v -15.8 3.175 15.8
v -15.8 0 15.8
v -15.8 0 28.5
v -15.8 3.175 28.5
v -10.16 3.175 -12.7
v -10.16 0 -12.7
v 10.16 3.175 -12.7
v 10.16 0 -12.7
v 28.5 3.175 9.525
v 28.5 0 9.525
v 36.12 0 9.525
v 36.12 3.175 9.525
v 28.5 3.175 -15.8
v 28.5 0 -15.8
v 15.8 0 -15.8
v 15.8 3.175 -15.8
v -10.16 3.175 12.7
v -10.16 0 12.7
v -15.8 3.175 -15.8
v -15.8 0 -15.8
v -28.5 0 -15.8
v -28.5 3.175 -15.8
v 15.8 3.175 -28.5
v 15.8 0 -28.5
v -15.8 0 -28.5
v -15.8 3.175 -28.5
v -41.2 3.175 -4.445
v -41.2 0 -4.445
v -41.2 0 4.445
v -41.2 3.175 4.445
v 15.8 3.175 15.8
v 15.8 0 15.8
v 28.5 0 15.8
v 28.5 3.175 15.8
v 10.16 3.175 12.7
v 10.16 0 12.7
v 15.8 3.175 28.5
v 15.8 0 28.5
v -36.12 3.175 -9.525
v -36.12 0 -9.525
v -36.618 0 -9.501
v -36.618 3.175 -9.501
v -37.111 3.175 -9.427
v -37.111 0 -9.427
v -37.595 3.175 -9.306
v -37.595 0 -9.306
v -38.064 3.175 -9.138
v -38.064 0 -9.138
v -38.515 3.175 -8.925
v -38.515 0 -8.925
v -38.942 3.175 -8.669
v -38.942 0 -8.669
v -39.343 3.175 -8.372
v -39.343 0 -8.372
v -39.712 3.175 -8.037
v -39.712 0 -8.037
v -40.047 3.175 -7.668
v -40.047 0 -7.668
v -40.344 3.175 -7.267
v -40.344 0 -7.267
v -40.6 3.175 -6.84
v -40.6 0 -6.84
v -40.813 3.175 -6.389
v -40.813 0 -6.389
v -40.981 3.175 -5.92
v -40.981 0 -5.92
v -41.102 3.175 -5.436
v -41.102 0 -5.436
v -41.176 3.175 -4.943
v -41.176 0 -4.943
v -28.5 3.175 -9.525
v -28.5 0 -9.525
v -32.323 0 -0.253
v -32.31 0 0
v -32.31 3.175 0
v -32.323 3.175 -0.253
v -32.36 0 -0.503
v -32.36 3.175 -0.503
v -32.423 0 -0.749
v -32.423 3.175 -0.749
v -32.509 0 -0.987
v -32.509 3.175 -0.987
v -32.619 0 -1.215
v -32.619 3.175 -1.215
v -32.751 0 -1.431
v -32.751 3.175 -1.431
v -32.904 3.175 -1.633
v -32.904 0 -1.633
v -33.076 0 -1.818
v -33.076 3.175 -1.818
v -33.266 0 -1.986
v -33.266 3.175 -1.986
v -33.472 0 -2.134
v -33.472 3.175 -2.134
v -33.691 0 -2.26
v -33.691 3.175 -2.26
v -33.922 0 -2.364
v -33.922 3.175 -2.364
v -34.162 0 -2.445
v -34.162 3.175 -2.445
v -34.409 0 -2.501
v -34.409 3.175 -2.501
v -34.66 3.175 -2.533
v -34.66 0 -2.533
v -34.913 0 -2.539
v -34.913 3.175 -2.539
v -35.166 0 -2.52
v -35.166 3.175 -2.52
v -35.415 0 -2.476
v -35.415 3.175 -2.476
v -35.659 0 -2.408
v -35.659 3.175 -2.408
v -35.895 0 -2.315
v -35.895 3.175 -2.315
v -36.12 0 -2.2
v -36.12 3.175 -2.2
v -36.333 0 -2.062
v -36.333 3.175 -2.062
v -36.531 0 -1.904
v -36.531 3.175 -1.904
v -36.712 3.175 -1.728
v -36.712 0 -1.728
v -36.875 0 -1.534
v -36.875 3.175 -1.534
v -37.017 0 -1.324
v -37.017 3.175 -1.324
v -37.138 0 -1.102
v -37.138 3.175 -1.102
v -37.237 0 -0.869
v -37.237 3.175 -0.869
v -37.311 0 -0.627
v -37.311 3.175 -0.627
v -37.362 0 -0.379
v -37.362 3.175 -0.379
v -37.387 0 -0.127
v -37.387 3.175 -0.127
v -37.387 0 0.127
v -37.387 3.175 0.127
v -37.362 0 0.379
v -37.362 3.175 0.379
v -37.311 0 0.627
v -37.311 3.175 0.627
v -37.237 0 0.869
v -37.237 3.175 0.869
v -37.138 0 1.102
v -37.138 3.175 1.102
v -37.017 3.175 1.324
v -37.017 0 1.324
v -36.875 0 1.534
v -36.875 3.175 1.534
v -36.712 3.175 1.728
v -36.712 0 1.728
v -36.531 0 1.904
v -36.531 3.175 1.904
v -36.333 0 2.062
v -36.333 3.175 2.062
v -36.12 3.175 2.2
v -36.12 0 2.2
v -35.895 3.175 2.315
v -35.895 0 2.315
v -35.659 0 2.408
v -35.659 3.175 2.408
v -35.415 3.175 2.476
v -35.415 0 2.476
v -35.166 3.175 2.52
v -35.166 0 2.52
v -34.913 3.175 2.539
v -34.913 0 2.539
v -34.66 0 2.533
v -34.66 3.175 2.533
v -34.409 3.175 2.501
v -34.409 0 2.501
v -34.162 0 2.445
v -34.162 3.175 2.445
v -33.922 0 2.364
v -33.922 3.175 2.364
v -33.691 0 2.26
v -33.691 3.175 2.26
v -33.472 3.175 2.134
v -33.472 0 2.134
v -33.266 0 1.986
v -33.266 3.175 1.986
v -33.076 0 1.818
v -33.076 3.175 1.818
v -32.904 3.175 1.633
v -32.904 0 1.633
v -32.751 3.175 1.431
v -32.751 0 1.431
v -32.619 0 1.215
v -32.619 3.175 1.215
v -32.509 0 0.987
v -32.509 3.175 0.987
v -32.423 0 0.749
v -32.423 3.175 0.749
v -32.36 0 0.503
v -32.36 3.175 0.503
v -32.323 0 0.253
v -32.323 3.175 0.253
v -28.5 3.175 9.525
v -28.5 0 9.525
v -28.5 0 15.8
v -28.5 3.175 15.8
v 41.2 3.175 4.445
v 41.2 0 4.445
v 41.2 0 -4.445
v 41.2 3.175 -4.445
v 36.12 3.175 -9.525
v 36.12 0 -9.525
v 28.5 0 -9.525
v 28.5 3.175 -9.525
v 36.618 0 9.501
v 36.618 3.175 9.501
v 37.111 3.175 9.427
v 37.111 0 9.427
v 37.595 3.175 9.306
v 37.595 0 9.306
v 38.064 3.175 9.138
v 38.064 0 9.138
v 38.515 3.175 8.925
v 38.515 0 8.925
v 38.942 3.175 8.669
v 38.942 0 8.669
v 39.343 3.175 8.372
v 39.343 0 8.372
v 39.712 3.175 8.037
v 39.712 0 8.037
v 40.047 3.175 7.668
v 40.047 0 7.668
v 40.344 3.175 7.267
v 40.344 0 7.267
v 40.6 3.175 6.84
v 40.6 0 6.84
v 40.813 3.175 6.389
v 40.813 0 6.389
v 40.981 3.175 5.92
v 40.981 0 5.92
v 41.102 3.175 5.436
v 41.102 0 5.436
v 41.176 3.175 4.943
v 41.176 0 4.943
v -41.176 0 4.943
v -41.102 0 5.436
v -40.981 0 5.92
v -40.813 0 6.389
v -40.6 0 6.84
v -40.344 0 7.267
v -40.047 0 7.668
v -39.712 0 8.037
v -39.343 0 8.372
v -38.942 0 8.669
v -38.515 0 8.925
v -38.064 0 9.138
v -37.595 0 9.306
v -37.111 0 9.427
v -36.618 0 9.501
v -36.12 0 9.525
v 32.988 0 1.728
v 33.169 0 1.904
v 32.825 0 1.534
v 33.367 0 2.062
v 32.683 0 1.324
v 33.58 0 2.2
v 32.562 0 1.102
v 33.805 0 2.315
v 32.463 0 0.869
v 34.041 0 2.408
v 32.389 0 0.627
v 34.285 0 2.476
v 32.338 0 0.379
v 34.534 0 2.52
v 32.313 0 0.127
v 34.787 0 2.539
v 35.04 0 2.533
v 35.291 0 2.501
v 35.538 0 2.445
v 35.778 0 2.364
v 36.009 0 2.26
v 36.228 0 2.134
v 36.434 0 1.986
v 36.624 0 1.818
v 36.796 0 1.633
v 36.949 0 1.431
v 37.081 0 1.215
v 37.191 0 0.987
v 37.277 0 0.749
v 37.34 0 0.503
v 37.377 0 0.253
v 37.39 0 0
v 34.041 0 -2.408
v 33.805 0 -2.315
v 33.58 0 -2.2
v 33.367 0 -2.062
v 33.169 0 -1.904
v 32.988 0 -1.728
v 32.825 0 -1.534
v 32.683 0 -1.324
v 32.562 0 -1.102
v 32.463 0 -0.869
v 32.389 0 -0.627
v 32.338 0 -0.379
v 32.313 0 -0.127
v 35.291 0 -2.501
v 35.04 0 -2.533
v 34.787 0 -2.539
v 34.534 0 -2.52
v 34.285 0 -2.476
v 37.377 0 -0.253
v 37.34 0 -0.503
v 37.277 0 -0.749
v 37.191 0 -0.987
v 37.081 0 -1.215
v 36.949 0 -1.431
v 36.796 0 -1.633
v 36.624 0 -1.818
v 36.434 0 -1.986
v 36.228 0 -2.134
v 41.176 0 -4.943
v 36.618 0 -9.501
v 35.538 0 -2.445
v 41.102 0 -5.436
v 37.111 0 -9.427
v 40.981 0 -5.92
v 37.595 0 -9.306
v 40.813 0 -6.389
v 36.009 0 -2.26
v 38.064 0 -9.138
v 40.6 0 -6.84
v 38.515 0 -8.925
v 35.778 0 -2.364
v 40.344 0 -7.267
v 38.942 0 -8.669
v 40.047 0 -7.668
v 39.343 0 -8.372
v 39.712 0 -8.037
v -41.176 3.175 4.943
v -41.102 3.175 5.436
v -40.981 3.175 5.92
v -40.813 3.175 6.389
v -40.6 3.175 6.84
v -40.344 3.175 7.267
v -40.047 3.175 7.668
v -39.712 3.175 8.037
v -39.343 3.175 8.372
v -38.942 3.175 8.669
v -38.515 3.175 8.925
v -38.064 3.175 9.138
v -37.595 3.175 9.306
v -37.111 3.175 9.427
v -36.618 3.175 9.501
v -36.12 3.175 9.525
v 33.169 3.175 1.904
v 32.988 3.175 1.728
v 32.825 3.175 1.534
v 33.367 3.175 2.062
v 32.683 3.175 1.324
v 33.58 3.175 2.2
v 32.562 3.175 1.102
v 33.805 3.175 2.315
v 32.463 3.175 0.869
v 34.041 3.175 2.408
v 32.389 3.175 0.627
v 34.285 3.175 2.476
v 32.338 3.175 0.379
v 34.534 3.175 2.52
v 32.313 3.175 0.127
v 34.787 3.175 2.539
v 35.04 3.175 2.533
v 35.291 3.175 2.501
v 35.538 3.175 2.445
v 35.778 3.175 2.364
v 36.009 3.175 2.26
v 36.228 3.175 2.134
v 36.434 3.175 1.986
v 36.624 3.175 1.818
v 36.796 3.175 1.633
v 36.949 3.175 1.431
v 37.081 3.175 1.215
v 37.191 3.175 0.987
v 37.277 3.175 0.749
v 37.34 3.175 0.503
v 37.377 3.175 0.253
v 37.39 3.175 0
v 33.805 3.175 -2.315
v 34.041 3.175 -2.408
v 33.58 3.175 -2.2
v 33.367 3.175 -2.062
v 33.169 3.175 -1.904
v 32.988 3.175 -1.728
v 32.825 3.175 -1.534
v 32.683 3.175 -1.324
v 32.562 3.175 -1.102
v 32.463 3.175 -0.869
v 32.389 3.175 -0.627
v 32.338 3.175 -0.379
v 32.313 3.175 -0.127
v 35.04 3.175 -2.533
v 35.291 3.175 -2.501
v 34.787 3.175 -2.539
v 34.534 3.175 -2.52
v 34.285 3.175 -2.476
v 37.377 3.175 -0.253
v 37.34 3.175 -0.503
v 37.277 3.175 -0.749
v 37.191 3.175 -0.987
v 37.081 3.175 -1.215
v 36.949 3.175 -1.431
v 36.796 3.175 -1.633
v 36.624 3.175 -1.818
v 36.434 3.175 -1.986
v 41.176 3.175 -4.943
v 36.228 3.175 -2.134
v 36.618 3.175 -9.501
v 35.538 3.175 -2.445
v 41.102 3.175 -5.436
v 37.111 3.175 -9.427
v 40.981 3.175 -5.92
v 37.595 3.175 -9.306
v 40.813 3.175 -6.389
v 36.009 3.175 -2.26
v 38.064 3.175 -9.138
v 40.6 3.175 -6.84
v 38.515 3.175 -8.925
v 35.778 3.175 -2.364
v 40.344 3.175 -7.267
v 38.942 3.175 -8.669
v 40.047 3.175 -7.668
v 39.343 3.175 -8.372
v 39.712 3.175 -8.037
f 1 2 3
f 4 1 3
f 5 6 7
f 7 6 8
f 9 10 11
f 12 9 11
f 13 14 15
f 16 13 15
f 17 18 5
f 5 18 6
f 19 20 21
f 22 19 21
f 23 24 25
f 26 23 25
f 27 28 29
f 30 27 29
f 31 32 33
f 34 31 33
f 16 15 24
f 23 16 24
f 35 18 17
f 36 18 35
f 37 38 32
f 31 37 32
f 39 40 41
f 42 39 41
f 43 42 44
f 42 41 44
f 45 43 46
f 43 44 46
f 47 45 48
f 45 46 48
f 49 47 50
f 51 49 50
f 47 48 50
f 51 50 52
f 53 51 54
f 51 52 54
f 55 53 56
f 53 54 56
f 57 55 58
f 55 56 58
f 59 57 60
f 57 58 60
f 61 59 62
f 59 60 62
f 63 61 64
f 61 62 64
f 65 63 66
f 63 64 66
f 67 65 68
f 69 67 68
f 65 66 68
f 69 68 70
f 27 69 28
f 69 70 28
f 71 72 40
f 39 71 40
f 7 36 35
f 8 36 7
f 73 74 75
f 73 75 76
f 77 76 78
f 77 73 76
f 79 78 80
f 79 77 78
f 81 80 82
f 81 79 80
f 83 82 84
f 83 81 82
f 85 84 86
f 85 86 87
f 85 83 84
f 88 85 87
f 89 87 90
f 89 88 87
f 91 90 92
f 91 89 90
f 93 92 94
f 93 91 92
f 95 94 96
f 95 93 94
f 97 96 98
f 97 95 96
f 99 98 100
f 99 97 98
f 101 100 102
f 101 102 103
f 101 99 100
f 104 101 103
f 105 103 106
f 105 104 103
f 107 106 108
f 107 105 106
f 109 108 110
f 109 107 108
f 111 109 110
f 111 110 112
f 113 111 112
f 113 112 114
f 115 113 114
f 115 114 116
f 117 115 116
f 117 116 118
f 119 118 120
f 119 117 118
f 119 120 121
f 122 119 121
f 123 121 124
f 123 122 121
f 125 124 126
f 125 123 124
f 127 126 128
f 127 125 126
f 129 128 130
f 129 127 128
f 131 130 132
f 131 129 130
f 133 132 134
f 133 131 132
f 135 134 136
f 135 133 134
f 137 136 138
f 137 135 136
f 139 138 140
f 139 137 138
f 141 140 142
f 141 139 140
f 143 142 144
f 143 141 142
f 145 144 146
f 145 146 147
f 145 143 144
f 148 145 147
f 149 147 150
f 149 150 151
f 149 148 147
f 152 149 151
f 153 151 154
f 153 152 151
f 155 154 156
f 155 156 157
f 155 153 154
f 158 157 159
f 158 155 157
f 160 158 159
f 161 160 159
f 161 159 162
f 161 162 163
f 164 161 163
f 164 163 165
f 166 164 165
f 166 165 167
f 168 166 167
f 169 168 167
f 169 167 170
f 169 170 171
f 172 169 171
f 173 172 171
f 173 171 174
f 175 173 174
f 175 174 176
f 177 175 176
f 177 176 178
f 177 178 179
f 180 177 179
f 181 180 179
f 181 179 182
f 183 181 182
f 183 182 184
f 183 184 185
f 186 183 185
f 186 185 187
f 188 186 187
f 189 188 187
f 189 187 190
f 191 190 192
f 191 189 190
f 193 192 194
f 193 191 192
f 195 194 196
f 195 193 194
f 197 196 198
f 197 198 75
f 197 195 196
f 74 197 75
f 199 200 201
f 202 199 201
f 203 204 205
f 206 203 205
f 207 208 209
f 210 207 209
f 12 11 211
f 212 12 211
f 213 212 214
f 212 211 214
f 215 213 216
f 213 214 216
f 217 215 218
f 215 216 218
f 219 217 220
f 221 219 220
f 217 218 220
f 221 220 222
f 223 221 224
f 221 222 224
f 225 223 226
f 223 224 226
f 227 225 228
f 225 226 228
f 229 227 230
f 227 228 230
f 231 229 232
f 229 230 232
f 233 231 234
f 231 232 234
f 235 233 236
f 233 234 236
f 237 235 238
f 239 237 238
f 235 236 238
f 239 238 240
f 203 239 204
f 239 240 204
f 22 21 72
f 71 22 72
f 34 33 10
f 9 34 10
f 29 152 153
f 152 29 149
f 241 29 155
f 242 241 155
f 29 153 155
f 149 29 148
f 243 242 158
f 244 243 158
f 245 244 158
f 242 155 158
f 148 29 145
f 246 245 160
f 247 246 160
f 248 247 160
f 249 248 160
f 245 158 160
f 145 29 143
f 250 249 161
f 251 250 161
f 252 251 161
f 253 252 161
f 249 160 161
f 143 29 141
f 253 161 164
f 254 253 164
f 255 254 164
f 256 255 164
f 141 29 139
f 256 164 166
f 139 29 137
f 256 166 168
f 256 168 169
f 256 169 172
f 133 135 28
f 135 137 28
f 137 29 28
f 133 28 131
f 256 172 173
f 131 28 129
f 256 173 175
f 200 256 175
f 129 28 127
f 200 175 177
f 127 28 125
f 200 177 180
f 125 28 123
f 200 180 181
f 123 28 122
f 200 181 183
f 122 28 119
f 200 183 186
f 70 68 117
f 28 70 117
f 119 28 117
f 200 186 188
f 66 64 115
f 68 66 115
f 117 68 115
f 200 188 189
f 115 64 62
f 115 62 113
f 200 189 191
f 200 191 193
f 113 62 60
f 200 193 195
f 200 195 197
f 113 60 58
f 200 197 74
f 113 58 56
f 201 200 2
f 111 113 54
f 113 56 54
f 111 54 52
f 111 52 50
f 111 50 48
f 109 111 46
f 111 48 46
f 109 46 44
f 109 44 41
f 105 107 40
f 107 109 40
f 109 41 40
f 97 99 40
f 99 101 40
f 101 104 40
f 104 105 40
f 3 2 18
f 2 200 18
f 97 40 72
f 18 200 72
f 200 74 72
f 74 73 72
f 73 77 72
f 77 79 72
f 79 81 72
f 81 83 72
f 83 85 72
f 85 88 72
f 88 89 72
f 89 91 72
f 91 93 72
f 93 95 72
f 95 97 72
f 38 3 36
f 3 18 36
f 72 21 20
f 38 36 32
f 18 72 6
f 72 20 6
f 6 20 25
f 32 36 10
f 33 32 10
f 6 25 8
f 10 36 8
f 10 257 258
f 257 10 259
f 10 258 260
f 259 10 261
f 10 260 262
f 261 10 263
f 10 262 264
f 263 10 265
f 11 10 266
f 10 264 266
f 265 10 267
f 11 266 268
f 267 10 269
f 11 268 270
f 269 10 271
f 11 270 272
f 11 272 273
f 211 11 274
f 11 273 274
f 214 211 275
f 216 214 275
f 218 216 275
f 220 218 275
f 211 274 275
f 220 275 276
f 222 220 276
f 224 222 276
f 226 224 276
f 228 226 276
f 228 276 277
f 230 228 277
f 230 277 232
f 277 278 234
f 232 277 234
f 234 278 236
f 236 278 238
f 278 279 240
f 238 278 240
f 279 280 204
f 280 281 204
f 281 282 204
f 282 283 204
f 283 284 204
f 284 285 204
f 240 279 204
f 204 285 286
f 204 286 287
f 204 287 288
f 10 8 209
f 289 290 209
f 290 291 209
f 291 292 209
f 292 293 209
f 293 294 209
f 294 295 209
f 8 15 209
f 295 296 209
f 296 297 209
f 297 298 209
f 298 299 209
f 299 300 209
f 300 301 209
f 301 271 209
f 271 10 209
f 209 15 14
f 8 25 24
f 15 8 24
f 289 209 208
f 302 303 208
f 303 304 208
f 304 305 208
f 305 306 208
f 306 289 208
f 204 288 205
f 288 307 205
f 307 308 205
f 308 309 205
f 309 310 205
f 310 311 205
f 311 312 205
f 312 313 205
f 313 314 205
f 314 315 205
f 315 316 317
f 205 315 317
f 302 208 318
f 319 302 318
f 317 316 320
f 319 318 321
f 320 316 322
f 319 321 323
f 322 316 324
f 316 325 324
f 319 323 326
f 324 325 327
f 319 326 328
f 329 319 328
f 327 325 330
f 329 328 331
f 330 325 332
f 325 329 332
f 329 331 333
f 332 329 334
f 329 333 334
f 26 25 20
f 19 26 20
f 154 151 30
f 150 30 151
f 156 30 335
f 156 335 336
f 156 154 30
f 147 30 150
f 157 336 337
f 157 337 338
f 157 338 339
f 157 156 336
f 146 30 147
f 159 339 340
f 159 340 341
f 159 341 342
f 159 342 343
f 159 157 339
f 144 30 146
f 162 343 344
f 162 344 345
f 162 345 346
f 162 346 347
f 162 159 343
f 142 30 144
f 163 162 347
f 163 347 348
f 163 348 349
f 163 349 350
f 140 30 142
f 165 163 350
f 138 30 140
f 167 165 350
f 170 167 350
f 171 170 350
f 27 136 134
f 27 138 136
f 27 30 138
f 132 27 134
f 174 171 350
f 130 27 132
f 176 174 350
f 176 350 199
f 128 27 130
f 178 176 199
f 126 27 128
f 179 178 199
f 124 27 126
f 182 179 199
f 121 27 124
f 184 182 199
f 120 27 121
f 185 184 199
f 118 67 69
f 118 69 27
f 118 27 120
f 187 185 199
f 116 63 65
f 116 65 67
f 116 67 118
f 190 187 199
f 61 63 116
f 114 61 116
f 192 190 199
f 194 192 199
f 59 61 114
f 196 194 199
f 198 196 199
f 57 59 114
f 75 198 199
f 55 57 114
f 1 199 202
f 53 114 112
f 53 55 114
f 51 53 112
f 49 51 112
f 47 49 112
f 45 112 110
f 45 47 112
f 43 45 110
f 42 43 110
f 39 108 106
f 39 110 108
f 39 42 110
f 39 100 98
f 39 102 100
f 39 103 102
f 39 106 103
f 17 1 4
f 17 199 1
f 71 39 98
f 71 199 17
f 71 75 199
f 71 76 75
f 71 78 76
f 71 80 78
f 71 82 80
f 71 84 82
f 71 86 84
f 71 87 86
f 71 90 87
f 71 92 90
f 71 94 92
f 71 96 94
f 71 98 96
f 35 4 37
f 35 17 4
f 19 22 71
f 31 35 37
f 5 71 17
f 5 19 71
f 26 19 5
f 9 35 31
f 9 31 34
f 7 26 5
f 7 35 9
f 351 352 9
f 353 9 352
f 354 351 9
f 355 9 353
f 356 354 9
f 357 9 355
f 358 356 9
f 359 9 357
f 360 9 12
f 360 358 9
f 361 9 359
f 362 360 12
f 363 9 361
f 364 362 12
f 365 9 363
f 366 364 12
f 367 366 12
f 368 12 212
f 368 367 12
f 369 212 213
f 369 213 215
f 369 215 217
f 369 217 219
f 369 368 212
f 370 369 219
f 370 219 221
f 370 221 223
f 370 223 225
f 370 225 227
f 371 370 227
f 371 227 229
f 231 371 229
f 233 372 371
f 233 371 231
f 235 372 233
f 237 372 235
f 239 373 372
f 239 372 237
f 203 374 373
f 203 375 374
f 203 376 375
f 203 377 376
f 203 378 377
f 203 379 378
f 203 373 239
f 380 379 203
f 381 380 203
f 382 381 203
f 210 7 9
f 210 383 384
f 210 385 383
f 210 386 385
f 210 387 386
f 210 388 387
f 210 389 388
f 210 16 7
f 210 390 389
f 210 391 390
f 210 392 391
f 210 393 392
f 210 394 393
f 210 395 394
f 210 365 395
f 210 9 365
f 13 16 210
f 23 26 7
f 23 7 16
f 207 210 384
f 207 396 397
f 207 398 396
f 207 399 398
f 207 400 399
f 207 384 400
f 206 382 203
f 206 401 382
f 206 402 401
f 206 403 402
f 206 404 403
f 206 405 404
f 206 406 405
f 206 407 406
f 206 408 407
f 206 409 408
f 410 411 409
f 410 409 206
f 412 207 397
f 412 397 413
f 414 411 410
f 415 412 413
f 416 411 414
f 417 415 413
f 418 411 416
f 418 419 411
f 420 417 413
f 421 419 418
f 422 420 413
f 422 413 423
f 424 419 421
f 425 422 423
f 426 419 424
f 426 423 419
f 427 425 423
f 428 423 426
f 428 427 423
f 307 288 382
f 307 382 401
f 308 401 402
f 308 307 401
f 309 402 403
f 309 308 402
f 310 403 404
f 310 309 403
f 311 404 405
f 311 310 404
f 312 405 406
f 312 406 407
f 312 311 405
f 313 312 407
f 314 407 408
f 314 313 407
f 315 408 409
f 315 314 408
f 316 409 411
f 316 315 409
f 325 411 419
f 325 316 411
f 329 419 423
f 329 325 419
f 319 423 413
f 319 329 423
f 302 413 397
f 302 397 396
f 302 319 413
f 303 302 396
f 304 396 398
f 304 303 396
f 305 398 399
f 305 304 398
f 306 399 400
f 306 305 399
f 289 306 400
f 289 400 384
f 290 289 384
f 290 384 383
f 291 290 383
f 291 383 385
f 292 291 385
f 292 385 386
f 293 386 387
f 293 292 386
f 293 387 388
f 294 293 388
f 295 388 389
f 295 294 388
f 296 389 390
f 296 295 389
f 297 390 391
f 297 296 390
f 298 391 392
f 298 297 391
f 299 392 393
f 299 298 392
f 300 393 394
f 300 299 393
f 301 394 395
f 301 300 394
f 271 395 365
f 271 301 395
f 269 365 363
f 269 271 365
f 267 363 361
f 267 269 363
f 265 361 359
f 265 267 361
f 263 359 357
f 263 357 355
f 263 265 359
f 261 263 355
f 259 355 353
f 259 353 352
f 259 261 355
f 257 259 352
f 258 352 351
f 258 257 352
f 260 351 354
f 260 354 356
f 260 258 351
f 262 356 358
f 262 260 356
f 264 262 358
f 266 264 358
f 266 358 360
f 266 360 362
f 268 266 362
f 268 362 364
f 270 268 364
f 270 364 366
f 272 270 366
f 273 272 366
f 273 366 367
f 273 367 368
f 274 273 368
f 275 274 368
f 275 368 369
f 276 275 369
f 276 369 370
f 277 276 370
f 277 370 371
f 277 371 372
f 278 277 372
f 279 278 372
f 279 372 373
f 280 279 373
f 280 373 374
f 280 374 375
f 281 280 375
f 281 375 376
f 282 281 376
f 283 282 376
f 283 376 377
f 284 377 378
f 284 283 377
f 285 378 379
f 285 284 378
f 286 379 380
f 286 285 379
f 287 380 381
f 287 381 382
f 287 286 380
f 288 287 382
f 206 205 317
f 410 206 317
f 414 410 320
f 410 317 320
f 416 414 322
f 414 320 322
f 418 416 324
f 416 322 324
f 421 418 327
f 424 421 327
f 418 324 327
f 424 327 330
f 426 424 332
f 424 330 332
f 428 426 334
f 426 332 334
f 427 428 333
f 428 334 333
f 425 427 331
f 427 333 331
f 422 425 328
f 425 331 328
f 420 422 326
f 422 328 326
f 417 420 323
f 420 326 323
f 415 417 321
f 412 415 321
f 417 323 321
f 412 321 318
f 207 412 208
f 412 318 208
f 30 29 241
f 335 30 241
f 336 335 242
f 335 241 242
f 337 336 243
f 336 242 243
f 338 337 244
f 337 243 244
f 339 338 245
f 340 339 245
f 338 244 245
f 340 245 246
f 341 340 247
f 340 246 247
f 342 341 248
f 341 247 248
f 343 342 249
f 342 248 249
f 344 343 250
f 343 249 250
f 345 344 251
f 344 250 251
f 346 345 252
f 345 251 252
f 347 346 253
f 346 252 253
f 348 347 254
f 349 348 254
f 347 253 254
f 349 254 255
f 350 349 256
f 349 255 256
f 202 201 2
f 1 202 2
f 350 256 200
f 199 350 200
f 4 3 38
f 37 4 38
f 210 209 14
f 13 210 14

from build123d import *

# Parameters (mm, degrees)
SKETCH1_R           = 2.54
SKETCH1_W           = 20.32
SKETCH1_H           = 25.4
BOSS_EXTRUDE1_DEPTH = 3.175


with BuildPart() as part:
    # Sketch1 → Boss-Extrude1 (new body)
    with BuildSketch(Plane(origin=(0, 0, 0), x_dir=(1, 0, 0), z_dir=(0, 1, 0))):
        with BuildLine():
            Line((-28.4999938, 15.7999938), (-28.4999938, 9.525))
            Line((-28.4999938, 9.525), (-36.1199938, 9.525))
            ThreePointArc((-36.1199938, 9.525), (-39.712096248, 8.037102448), (-41.1999938, 4.445))
            Line((-41.1999938, 4.445), (-41.1999938, -4.445))
            ThreePointArc((-41.1999938, -4.445), (-39.712096248, -8.037102448), (-36.1199938, -9.525))
            Line((-36.1199938, -9.525), (-28.4999938, -9.525))
            Line((-28.4999938, -9.525), (-28.4999938, -15.7999938))
            Line((-28.4999938, -15.7999938), (-15.7999938, -15.7999938))
            Line((-15.7999938, -15.7999938), (-15.7999938, -28.4999938))
            Line((-15.7999938, -28.4999938), (15.7999938, -28.4999938))
            Line((15.7999938, -28.4999938), (15.7999938, -15.7999938))
            Line((15.7999938, -15.7999938), (28.4999938, -15.7999938))
            Line((28.4999938, -15.7999938), (28.4999938, -9.525))
            Line((28.4999938, -9.525), (36.1199938, -9.525))
            ThreePointArc((36.1199938, -9.525), (39.712096248, -8.037102448), (41.1999938, -4.445))
            Line((41.1999938, -4.445), (41.1999938, 4.445))
            ThreePointArc((41.1999938, 4.445), (39.712096248, 8.037102448), (36.1199938, 9.525))
            Line((36.1199938, 9.525), (28.4999938, 9.525))
            Line((28.4999938, 9.525), (28.4999938, 15.7999938))
            Line((28.4999938, 15.7999938), (15.7999938, 15.7999938))
            Line((15.7999938, 15.7999938), (15.7999938, 28.4999938))
            Line((15.7999938, 28.4999938), (-15.7999938, 28.4999938))
            Line((-15.7999938, 28.4999938), (-15.7999938, 15.7999938))
            Line((-15.7999938, 15.7999938), (-28.4999938, 15.7999938))
        make_face()
        with Locations((-34.8499938, 0)):
            Circle(SKETCH1_R, mode=Mode.SUBTRACT)
        with Locations((34.8499938, 0)):
            Circle(SKETCH1_R, mode=Mode.SUBTRACT)
        Rectangle(SKETCH1_W, SKETCH1_H, mode=Mode.SUBTRACT)
    extrude(amount=BOSS_EXTRUDE1_DEPTH)


solid = part.part
